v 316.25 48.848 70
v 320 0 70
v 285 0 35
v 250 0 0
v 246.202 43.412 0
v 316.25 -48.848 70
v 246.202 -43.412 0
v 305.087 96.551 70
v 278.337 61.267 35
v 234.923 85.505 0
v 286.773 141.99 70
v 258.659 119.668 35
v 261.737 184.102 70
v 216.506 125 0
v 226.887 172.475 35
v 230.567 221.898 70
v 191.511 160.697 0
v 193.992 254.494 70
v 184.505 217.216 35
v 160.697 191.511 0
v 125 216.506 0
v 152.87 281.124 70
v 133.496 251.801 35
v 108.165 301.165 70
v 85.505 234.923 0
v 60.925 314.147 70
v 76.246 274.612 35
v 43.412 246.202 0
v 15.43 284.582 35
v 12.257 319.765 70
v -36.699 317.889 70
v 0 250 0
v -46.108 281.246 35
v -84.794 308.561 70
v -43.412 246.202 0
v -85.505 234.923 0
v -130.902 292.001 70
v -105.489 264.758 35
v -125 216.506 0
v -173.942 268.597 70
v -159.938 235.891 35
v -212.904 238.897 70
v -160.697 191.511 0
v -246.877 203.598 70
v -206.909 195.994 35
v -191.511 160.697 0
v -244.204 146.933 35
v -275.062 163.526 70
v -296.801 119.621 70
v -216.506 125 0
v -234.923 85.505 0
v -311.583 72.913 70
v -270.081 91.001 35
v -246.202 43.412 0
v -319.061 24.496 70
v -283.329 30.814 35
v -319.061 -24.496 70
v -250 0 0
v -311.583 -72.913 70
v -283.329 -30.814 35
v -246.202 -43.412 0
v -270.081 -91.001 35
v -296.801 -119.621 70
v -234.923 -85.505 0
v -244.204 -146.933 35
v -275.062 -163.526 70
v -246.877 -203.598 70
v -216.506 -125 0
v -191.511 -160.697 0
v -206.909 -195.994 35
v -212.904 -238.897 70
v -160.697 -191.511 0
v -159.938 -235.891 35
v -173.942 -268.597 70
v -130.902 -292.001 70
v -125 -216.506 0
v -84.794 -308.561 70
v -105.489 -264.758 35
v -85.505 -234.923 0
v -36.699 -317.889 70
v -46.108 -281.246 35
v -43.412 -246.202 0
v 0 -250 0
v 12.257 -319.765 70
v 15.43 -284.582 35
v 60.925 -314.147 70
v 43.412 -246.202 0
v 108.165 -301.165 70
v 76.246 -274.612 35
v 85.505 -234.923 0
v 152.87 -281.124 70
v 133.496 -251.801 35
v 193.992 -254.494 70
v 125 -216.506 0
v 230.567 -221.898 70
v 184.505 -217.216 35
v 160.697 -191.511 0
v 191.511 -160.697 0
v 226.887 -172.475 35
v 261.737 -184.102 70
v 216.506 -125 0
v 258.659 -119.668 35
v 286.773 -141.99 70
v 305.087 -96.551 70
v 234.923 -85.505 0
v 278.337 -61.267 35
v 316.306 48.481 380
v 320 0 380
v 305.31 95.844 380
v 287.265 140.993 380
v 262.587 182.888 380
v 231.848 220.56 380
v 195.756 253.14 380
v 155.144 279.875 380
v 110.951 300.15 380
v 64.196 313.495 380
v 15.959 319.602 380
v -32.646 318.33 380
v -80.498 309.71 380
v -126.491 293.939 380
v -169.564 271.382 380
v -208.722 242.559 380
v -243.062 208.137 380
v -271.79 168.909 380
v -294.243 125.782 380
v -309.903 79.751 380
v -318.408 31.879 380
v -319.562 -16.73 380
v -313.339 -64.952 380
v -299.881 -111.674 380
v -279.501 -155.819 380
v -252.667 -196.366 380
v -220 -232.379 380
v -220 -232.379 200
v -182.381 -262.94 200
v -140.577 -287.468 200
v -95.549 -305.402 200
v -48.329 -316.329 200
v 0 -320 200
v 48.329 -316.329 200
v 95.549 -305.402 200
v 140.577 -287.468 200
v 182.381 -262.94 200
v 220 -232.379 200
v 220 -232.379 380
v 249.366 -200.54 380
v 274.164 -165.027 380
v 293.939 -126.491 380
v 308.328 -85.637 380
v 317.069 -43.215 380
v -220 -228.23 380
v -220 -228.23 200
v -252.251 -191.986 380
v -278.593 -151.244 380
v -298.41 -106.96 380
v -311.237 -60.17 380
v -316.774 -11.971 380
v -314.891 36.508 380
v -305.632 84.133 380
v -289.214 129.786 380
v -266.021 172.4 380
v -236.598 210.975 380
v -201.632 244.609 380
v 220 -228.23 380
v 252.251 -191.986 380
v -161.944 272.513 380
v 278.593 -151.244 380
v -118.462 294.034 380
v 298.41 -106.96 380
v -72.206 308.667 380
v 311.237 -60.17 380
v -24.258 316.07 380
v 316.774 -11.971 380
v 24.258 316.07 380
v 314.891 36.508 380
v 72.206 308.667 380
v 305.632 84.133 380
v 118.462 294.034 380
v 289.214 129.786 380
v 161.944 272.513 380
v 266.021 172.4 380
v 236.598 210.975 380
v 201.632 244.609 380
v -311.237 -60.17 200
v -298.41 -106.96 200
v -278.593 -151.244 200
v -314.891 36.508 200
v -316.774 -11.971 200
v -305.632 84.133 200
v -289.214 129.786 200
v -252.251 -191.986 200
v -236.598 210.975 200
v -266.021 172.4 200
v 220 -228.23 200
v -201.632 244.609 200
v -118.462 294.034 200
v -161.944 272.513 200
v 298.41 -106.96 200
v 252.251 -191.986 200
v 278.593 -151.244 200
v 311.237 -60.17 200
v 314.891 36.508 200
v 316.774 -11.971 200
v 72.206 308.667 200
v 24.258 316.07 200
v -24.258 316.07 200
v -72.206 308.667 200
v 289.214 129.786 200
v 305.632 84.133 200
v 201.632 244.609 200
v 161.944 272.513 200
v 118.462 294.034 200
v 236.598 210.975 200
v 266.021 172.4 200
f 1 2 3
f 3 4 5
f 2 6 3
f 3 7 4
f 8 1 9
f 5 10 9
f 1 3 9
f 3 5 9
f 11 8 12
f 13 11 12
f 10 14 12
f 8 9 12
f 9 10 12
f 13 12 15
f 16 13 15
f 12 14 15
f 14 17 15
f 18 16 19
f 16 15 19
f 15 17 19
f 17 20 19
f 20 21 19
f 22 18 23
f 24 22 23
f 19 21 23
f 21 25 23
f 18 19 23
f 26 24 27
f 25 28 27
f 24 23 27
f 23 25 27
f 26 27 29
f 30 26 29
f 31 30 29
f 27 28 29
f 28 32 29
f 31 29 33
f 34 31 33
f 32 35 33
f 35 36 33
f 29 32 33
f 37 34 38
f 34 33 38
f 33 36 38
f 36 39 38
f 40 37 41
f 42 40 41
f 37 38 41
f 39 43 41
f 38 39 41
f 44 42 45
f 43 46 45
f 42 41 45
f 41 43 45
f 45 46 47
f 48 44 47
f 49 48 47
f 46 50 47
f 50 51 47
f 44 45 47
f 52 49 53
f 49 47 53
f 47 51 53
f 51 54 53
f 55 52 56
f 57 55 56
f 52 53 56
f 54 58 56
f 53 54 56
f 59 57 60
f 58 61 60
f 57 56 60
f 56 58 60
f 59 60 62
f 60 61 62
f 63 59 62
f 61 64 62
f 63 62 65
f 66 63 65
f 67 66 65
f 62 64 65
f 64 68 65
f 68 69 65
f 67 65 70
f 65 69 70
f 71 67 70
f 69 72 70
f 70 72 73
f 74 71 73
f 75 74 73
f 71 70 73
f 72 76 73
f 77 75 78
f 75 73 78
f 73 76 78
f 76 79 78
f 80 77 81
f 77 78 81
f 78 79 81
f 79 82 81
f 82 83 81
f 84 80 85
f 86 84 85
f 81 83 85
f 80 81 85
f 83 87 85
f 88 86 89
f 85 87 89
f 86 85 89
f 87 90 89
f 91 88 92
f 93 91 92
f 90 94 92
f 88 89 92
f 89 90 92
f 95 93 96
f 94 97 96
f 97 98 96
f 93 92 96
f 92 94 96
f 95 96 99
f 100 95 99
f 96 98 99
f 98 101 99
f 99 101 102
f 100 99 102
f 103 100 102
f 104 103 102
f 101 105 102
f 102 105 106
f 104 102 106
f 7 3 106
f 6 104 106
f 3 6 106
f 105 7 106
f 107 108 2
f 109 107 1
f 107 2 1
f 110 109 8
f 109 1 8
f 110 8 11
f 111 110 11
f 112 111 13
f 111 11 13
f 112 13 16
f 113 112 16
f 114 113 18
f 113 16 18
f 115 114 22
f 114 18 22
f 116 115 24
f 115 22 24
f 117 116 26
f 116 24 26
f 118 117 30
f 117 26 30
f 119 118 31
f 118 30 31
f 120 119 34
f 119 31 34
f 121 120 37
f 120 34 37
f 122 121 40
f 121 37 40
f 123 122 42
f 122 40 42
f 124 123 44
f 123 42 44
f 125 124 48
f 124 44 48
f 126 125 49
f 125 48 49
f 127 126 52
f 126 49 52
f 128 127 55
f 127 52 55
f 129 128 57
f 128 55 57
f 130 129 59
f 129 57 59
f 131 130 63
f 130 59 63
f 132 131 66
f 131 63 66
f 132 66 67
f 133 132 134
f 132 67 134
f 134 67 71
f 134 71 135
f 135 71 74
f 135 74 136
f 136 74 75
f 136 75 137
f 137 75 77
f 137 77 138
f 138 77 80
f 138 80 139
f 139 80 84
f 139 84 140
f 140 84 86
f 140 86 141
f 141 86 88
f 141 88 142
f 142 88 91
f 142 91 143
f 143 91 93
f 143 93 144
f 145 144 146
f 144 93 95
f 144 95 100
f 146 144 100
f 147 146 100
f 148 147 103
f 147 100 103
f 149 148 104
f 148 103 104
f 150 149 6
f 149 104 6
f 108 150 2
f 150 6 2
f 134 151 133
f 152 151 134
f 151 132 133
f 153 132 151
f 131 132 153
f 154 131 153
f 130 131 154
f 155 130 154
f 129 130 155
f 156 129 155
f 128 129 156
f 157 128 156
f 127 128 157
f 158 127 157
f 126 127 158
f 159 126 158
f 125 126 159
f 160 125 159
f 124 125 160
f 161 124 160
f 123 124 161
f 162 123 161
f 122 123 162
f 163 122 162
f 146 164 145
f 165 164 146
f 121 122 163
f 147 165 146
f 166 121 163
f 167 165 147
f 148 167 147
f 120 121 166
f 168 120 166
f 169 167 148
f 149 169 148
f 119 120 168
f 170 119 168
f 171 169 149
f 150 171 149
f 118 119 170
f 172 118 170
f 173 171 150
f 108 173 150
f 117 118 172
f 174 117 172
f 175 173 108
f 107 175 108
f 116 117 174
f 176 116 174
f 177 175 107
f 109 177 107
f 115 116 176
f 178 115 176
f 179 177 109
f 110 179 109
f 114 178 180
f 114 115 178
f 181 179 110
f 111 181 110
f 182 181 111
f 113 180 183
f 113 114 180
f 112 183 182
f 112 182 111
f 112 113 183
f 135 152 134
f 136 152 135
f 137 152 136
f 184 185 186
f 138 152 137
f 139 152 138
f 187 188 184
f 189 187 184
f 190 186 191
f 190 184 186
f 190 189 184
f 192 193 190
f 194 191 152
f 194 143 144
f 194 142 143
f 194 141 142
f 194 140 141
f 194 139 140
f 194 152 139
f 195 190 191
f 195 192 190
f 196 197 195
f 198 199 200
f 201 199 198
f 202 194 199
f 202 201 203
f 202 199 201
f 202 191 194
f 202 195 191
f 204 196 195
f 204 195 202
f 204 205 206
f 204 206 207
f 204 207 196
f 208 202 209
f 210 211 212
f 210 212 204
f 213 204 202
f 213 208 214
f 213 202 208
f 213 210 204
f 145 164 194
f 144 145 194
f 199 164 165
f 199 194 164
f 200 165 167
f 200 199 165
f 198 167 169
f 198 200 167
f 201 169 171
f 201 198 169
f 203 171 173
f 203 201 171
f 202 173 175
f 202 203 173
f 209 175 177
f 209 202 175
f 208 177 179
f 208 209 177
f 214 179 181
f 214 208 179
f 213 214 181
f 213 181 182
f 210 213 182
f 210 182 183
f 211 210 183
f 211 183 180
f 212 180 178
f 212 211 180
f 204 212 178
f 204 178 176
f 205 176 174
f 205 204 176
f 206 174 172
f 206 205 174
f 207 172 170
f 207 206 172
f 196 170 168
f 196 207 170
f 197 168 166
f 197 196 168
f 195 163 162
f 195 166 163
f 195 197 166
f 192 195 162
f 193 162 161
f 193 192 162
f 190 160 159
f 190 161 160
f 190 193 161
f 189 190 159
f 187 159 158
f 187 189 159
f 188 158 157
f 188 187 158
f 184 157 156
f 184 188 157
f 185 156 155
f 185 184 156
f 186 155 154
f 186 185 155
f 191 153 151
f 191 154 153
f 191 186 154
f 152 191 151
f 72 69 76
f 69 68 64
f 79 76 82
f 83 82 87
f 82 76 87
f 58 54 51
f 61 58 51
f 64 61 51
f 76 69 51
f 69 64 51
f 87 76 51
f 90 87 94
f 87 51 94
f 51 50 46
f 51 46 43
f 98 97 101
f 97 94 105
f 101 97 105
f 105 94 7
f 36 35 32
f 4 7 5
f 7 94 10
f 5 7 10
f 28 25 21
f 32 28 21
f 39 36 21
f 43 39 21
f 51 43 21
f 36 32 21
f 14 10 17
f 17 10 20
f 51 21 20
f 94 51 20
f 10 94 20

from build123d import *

# Parameters (mm, degrees)
ESQUISSE1_R             = 320
BOSS_EXTRU_1_DEPTH      = 200
CHANFREIN2_SIZE         = 70
ESQUISSE2_R             = 320
ESQUISSE2_R_2           = 317
BOSS_EXTRU_2_DEPTH      = 180
ESQUISSE3_W             = 440
ESQUISSE3_H             = 180
ENL_V_MAT_EXTRU_1_DEPTH = 591.931468108


with BuildPart() as part:
    # Esquisse1 → Boss.-Extru.1 (new body)
    with BuildSketch(Plane.XY):
        Circle(ESQUISSE1_R)
    extrude(amount=BOSS_EXTRU_1_DEPTH)

    # Chanfrein2
    chanfrein2_edges = [part.edges().sort_by_distance(p)[0] for p in [
        (-320, 0, 0),
    ]]
    chamfer(chanfrein2_edges, length=CHANFREIN2_SIZE)

    # Esquisse2 → Boss.-Extru.2 (add)
    with BuildSketch(Plane.XY.offset(200)):
        Circle(ESQUISSE2_R)
        with Locations(Location((0, 0, 0), (0, 0, 180))):
            Circle(ESQUISSE2_R_2, mode=Mode.SUBTRACT)
    extrude(amount=BOSS_EXTRU_2_DEPTH)

    # Esquisse3 → Enlèv. mat.-Extru.1 (cut, through all)
    with BuildSketch(Plane(origin=(0, 0, 0), x_dir=(1, 0, 0), z_dir=(0, 1, 0))):
        with Locations((0, -290)):
            Rectangle(ESQUISSE3_W, ESQUISSE3_H)
    extrude(amount=-ENL_V_MAT_EXTRU_1_DEPTH, mode=Mode.SUBTRACT)


solid = part.part
